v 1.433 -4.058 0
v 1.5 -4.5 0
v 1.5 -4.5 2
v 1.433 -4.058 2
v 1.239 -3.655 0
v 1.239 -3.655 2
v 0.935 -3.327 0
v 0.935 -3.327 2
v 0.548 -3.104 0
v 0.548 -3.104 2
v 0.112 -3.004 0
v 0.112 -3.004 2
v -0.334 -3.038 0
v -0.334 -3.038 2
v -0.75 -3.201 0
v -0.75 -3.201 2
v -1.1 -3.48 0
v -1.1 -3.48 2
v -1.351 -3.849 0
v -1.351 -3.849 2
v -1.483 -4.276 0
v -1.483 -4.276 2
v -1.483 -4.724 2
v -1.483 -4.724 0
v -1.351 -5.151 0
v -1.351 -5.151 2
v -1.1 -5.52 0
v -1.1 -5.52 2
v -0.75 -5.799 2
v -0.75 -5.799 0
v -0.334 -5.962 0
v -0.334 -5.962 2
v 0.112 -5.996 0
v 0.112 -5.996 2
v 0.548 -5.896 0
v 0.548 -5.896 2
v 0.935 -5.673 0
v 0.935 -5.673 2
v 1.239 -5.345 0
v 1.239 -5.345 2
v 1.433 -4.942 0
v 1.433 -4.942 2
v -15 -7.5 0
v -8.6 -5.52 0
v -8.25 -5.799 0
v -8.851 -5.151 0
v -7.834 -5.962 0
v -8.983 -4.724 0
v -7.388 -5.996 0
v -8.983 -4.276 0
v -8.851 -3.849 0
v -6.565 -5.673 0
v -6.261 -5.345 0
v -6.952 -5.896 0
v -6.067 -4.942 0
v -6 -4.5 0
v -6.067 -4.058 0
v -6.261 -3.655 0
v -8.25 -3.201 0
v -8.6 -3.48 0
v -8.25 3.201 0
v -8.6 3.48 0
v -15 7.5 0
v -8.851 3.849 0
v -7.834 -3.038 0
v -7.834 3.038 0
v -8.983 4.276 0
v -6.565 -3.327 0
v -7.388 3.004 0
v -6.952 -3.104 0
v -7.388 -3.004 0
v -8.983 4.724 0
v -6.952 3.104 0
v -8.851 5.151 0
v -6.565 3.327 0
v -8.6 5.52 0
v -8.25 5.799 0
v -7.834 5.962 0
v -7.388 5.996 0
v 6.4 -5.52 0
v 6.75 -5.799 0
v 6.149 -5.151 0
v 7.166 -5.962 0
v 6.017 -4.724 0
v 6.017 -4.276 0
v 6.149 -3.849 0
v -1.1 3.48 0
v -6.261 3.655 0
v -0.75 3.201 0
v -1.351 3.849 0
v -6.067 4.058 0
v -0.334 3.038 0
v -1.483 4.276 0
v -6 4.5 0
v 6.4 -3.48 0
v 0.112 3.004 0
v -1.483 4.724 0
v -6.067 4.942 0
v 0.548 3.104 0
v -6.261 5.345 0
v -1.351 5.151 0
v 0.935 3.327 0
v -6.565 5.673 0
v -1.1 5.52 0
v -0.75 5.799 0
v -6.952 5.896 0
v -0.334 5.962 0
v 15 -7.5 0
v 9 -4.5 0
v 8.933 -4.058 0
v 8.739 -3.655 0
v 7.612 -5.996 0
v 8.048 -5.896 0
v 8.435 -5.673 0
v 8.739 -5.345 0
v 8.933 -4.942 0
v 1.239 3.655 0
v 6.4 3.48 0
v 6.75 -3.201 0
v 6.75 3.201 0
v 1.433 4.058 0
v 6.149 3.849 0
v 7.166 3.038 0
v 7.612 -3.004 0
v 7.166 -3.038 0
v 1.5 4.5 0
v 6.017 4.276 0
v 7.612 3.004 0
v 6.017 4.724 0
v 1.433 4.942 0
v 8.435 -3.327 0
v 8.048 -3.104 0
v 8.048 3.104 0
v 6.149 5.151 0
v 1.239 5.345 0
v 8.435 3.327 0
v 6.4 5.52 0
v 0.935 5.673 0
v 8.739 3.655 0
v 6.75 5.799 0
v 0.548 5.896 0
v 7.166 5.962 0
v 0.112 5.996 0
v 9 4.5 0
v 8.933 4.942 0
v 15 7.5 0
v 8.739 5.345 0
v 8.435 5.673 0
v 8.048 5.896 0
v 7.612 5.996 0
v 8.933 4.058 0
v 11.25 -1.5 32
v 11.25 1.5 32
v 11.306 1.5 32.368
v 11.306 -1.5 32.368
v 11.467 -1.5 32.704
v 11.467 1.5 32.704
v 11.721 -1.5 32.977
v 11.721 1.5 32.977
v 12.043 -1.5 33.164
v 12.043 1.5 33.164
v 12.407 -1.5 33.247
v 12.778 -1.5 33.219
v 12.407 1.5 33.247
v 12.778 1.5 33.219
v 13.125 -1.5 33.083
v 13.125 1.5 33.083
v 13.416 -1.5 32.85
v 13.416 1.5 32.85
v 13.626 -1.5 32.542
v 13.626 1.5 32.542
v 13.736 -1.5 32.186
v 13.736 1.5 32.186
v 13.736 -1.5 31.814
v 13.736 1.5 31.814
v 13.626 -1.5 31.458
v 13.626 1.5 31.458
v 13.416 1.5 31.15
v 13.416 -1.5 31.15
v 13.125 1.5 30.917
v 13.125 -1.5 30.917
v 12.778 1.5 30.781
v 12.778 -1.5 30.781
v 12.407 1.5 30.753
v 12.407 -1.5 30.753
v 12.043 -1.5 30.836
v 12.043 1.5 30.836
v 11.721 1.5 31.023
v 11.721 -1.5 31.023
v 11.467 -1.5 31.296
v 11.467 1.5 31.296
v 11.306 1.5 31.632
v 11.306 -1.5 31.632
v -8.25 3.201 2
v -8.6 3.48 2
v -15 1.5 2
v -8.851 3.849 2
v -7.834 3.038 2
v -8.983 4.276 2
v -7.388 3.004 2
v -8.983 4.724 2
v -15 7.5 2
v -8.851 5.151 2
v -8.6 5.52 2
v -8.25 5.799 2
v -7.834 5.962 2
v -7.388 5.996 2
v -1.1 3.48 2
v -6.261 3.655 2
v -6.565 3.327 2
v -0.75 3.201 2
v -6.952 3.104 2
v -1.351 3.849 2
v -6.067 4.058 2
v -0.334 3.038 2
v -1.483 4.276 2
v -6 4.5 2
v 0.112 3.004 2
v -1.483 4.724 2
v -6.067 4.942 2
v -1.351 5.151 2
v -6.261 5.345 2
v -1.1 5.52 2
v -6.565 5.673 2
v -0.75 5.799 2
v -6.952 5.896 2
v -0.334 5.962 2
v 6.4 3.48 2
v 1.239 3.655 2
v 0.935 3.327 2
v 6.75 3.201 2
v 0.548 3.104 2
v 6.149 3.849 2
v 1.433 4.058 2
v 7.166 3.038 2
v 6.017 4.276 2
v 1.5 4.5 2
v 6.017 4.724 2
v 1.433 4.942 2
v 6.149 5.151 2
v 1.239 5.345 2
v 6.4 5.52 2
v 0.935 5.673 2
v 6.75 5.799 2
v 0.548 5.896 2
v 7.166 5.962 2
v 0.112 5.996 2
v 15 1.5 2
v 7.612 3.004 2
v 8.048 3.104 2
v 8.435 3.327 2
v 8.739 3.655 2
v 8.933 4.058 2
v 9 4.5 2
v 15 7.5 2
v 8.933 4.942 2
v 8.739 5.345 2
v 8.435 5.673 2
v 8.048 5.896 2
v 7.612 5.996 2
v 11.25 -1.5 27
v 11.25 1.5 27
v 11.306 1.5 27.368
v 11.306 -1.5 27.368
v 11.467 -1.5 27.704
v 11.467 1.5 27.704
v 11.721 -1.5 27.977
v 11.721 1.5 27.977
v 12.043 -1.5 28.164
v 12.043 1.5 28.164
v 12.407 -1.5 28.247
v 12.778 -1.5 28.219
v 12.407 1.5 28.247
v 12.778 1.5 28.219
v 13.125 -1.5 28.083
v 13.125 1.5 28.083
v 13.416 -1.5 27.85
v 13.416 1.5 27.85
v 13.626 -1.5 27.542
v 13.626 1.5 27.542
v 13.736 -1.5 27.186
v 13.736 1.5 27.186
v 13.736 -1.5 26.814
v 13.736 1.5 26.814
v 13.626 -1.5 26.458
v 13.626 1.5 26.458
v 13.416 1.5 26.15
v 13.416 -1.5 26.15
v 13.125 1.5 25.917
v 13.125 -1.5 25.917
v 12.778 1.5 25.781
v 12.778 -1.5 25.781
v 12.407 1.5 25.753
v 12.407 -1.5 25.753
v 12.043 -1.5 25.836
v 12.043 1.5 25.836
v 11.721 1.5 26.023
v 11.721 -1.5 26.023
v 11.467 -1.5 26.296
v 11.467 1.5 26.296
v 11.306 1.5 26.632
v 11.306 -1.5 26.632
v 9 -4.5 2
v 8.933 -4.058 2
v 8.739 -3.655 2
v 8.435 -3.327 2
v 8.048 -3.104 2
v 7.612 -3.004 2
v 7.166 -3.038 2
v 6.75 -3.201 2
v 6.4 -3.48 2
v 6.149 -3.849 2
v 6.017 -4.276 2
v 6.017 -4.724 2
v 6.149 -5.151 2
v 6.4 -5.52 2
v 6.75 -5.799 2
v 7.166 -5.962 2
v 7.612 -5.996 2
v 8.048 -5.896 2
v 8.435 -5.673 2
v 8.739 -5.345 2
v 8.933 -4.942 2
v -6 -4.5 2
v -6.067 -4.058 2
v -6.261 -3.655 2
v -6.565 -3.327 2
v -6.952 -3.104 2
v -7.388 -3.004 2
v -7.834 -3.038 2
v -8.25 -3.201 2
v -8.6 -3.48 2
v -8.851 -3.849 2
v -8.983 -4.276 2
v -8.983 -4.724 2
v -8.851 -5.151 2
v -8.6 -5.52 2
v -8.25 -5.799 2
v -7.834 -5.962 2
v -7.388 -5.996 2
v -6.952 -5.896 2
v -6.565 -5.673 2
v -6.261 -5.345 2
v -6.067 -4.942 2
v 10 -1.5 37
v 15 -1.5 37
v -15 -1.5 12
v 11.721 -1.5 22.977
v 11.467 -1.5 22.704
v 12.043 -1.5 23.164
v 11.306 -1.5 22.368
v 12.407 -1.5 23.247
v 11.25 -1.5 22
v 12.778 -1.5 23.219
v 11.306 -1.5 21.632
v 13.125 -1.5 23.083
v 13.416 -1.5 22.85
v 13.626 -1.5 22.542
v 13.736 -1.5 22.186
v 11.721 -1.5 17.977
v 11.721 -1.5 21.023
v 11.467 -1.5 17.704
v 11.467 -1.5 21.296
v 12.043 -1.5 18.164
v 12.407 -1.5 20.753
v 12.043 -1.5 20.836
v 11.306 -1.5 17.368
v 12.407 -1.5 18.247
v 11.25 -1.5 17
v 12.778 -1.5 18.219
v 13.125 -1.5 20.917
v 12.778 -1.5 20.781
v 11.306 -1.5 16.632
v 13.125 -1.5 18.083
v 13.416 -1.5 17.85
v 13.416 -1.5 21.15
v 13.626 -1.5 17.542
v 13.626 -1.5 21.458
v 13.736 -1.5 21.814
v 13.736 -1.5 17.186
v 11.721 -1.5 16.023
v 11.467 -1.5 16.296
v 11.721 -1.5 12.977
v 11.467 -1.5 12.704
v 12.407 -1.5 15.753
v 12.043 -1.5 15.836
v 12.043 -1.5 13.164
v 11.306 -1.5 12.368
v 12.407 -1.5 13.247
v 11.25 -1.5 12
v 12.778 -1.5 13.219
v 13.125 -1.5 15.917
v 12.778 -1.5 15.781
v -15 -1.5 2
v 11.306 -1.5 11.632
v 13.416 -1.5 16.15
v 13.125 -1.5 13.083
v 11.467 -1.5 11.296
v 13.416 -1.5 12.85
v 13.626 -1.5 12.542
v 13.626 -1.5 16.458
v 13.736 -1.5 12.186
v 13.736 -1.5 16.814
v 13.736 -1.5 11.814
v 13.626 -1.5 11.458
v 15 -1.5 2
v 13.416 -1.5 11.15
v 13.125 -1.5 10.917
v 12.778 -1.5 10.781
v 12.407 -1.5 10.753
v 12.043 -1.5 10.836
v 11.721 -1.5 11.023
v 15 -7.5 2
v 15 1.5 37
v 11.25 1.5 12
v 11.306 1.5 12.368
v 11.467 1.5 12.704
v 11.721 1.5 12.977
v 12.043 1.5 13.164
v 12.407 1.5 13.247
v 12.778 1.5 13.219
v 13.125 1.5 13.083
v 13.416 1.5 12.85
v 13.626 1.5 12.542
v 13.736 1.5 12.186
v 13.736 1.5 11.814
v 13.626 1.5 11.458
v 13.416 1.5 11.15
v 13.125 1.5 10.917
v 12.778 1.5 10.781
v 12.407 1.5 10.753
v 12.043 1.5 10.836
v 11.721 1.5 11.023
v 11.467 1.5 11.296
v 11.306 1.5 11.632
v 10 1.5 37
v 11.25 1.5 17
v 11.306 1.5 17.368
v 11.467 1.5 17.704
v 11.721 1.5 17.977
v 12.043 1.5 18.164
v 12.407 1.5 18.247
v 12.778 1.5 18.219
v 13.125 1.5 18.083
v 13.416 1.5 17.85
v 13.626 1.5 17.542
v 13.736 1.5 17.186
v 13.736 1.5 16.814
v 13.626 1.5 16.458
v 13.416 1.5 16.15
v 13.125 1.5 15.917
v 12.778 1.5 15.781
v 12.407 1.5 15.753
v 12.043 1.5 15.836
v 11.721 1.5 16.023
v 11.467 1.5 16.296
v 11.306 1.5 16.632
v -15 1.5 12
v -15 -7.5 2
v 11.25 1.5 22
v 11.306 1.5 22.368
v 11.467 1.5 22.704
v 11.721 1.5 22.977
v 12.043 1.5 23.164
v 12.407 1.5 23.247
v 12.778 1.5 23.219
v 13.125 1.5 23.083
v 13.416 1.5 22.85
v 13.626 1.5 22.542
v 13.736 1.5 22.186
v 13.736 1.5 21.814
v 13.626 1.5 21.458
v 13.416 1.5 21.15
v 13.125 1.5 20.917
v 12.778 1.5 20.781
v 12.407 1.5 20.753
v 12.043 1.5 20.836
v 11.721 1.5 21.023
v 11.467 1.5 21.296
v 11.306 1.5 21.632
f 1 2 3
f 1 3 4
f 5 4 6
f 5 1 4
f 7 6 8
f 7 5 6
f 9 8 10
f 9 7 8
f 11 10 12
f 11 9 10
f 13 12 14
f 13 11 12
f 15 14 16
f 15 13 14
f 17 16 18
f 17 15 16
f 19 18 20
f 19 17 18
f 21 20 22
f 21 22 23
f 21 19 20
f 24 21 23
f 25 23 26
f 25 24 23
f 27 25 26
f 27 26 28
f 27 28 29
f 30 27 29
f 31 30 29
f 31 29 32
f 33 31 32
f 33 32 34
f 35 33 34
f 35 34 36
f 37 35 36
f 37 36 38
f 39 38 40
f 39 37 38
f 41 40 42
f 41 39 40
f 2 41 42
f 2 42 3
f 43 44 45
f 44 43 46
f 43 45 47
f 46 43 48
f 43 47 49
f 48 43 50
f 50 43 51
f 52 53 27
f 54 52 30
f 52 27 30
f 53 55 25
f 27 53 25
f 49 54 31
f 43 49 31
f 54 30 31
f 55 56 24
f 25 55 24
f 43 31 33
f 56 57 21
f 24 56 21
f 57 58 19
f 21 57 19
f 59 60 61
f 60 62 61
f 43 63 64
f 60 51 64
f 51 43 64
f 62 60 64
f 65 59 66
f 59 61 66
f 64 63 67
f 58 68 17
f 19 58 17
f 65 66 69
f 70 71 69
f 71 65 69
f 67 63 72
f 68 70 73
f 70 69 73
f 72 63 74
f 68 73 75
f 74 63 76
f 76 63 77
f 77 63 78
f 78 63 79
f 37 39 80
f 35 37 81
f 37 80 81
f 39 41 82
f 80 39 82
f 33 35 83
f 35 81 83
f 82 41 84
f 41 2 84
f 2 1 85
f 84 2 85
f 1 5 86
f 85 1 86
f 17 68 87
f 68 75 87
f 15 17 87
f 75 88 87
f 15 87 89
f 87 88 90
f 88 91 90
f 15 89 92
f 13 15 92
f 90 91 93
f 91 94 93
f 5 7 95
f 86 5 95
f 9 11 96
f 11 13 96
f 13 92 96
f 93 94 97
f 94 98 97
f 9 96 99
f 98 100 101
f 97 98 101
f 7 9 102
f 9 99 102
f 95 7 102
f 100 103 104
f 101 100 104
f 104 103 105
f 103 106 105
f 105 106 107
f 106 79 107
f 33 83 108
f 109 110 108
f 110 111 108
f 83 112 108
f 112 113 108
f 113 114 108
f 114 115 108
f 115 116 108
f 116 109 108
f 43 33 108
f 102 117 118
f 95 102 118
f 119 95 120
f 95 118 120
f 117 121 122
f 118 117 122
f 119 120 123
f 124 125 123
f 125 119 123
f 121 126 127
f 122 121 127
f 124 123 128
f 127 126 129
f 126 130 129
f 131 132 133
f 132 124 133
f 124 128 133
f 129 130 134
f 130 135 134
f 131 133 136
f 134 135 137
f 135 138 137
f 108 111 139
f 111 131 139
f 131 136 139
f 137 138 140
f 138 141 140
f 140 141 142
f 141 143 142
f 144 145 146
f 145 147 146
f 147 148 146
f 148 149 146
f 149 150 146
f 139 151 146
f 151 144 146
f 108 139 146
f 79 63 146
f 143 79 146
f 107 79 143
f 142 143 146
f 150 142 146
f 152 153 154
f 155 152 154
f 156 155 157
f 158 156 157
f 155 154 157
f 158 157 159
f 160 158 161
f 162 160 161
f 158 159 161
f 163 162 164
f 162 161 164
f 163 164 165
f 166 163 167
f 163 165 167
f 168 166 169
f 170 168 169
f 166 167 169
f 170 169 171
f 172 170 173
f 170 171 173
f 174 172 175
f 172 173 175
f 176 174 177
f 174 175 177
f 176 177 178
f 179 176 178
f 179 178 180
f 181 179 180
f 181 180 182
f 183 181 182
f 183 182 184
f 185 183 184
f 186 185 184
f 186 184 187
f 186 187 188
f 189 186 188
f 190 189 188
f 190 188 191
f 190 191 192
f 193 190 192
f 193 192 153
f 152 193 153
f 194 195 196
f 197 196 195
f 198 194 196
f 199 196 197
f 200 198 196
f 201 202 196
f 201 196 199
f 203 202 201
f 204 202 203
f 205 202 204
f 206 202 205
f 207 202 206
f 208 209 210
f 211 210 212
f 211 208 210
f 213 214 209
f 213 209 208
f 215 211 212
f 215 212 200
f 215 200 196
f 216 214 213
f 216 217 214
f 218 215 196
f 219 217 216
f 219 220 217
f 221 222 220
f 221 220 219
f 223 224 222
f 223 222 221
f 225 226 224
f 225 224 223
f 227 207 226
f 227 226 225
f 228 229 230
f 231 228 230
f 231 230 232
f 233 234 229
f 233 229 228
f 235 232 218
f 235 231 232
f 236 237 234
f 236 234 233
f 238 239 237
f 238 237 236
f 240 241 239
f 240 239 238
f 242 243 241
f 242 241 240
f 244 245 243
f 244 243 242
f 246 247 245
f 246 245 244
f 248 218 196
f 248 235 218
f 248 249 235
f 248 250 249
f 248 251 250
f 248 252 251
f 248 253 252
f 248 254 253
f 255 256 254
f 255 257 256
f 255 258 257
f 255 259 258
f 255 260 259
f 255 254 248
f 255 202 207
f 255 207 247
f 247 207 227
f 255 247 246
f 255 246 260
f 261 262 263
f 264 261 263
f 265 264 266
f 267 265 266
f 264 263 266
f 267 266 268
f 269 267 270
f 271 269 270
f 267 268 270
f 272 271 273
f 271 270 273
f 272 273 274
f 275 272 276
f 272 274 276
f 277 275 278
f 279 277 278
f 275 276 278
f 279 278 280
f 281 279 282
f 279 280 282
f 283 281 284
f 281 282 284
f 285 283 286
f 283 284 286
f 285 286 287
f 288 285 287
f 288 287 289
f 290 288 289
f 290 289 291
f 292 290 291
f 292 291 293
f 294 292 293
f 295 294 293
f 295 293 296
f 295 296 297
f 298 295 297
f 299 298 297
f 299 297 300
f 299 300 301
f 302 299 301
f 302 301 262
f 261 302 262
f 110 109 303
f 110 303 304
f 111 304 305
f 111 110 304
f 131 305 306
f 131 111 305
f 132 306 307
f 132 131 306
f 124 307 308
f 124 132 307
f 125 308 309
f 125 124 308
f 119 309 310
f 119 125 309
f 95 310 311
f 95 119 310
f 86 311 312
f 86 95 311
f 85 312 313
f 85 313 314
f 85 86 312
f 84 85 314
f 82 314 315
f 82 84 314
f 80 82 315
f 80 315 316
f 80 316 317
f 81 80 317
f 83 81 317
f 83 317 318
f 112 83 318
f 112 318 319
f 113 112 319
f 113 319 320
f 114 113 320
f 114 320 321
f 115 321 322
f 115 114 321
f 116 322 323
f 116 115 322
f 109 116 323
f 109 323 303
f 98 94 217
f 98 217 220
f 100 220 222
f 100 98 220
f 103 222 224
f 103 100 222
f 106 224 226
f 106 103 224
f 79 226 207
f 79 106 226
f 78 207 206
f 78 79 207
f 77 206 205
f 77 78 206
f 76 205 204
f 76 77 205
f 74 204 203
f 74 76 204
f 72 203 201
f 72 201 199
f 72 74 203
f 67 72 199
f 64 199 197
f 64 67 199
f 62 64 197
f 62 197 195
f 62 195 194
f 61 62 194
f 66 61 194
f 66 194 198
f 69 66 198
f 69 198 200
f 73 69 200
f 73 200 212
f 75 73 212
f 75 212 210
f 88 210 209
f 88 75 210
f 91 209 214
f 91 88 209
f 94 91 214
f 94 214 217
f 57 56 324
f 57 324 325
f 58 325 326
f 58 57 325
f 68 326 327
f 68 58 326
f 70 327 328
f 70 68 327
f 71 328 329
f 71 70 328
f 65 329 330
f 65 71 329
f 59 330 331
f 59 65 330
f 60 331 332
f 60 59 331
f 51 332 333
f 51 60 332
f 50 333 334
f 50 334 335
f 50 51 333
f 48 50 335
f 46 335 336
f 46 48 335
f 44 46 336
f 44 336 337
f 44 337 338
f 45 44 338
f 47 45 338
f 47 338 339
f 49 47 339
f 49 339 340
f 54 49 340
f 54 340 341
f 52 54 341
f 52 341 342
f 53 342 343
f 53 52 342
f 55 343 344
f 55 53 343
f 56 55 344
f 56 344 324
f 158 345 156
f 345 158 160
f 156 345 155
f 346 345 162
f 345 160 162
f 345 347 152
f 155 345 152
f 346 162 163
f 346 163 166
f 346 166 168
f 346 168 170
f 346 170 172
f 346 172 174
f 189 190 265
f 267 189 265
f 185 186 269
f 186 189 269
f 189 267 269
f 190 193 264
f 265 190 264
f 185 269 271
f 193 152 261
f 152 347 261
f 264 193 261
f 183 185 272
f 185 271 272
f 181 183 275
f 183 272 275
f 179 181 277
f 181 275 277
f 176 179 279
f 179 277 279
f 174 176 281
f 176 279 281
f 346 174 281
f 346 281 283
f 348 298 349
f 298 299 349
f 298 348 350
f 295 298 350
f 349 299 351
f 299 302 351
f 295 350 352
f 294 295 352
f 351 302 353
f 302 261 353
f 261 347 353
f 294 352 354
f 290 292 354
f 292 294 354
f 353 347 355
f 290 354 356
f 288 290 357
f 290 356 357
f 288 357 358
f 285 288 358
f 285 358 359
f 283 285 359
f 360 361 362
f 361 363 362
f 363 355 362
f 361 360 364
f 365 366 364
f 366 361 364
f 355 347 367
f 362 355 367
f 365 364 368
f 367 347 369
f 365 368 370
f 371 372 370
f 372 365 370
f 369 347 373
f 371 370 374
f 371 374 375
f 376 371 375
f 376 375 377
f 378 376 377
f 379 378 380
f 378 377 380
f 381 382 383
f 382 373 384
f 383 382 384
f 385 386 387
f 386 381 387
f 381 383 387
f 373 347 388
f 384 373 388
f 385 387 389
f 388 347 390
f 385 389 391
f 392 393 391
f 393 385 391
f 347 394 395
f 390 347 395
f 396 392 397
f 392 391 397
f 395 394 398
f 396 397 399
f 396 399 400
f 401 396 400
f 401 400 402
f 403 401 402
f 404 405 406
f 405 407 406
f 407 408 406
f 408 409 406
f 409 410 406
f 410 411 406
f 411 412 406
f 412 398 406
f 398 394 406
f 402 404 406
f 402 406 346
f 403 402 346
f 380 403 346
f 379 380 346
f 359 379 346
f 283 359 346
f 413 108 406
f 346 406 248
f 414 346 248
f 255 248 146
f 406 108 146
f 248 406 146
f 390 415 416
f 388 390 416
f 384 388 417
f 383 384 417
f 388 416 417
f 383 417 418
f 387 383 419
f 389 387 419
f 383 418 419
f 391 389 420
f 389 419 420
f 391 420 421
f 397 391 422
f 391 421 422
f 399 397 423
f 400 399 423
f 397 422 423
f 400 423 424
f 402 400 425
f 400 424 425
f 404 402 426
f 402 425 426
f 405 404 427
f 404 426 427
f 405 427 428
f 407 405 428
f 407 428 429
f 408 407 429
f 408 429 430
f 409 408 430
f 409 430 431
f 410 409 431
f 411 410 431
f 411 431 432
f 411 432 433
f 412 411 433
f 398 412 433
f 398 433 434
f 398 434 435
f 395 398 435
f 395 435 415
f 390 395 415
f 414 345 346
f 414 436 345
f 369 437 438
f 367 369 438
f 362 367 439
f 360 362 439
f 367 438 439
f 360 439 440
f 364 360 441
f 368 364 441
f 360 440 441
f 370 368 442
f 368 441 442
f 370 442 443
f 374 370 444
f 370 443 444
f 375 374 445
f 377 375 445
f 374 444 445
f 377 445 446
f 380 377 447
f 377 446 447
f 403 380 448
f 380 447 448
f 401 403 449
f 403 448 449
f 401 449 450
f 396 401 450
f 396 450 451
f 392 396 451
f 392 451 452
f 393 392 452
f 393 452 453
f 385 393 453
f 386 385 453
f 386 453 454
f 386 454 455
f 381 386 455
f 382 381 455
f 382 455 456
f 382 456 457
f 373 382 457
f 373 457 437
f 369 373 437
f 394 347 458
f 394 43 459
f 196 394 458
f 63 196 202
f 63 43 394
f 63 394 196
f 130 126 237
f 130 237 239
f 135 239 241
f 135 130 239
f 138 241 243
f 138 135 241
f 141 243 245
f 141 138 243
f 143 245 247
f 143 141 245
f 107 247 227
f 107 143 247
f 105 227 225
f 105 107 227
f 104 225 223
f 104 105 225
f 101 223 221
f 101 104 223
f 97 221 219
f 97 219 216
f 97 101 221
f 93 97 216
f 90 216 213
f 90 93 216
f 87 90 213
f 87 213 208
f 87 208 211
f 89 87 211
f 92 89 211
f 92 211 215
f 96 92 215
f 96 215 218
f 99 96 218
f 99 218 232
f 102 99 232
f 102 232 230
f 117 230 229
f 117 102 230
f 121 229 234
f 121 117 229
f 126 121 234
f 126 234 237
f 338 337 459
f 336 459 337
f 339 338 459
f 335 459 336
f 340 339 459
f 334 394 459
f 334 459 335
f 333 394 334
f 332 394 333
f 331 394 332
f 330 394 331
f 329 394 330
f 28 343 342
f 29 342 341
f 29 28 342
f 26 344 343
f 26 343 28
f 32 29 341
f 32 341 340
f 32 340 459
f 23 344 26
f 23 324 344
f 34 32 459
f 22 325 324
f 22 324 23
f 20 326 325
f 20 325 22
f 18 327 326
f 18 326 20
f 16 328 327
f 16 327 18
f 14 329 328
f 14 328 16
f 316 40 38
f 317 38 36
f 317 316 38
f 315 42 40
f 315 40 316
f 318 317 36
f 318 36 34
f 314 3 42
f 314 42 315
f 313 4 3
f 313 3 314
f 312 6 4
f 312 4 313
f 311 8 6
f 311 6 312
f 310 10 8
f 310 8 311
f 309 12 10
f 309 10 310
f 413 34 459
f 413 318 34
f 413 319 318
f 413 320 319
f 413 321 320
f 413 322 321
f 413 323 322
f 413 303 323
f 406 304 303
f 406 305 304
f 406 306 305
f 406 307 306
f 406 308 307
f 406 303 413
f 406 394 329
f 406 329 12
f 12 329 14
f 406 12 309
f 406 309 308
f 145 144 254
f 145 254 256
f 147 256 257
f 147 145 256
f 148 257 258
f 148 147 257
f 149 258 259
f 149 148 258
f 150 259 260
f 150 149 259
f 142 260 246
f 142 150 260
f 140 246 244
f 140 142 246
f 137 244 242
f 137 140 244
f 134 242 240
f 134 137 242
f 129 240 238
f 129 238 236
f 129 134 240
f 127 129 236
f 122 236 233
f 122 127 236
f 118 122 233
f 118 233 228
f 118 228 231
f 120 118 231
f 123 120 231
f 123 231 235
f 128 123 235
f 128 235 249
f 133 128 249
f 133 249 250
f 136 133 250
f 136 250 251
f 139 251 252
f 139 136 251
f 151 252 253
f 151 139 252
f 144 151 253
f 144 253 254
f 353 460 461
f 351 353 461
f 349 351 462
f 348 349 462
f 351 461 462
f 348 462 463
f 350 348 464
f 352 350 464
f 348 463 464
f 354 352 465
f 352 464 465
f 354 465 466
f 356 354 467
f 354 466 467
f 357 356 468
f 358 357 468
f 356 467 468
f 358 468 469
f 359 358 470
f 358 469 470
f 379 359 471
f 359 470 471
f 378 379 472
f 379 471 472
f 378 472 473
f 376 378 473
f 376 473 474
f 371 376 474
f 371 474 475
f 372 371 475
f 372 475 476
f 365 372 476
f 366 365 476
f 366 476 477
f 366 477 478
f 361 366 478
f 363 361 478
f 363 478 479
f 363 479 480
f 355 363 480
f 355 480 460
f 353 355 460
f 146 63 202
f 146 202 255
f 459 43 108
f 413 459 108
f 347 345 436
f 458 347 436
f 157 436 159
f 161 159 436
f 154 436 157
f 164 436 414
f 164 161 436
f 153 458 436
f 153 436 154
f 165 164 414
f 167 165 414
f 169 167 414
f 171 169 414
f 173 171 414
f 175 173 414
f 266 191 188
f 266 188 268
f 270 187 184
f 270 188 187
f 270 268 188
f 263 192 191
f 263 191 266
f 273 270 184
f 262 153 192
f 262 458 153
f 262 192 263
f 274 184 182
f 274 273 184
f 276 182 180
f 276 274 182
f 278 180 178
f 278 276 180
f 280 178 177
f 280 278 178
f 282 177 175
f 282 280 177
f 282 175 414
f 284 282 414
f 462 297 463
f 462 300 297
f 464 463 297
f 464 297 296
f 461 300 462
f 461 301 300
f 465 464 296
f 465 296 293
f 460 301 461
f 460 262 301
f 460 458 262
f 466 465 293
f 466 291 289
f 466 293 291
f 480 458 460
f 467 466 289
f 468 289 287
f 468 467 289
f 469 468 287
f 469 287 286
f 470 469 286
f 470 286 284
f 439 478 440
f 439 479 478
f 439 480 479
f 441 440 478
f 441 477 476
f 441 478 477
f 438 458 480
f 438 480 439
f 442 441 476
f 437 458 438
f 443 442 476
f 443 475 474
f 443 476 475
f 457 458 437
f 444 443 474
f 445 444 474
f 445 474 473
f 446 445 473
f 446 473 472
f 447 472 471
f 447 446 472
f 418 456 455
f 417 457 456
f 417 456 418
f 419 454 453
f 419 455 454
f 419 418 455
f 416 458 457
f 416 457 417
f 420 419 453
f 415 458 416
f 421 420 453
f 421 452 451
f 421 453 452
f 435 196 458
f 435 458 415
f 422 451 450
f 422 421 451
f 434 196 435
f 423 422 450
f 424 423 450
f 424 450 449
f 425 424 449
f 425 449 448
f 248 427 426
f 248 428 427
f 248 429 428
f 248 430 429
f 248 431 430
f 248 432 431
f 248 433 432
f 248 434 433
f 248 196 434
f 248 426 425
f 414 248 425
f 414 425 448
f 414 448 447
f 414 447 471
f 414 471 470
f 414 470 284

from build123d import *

# Parameters (mm, degrees)
F0_W     = 30
F0_H     = 15
F0_R     = 1.5
F1_DEPTH = 2
F2_W     = 30
F2_H     = 3
F3_DEPTH = 35
F4_SIZE  = 25
F6_D     = 2.5


with BuildPart() as f1:
    # F0 (on Top) → F1 (new body)
    with BuildSketch(Plane.XY):
        Rectangle(F0_W, F0_H)
        with Locations((-7.5, -4.5)):
            Circle(F0_R, mode=Mode.SUBTRACT)
        with Locations((0, -4.5)):
            Circle(F0_R, mode=Mode.SUBTRACT)
        with Locations((7.5, -4.5)):
            Circle(F0_R, mode=Mode.SUBTRACT)
        with Locations((-7.5, 4.5)):
            Circle(F0_R, mode=Mode.SUBTRACT)
        with Locations((0, 4.5)):
            Circle(F0_R, mode=Mode.SUBTRACT)
        with Locations((7.5, 4.5)):
            Circle(F0_R, mode=Mode.SUBTRACT)
    extrude(amount=F1_DEPTH)

    # F2 (on face) → F3 (join)
    with BuildSketch(Plane.XY.offset(2)):
        Rectangle(F2_W, F2_H)
    extrude(amount=F3_DEPTH)

    # F4
    f4_edges = [f1.edges().sort_by_distance(p)[0] for p in [
        (-15, 0, 37),
    ]]
    chamfer(f4_edges, length=F4_SIZE)

    # F6 (through all)
    with Locations(Plane.XZ.offset(1.5)):
        with Locations((12.5, 32), (12.5, 27), (12.5, 22), (12.5, 17), (12.5, 12)):
            Hole(F6_D / 2)


solid = f1.part
